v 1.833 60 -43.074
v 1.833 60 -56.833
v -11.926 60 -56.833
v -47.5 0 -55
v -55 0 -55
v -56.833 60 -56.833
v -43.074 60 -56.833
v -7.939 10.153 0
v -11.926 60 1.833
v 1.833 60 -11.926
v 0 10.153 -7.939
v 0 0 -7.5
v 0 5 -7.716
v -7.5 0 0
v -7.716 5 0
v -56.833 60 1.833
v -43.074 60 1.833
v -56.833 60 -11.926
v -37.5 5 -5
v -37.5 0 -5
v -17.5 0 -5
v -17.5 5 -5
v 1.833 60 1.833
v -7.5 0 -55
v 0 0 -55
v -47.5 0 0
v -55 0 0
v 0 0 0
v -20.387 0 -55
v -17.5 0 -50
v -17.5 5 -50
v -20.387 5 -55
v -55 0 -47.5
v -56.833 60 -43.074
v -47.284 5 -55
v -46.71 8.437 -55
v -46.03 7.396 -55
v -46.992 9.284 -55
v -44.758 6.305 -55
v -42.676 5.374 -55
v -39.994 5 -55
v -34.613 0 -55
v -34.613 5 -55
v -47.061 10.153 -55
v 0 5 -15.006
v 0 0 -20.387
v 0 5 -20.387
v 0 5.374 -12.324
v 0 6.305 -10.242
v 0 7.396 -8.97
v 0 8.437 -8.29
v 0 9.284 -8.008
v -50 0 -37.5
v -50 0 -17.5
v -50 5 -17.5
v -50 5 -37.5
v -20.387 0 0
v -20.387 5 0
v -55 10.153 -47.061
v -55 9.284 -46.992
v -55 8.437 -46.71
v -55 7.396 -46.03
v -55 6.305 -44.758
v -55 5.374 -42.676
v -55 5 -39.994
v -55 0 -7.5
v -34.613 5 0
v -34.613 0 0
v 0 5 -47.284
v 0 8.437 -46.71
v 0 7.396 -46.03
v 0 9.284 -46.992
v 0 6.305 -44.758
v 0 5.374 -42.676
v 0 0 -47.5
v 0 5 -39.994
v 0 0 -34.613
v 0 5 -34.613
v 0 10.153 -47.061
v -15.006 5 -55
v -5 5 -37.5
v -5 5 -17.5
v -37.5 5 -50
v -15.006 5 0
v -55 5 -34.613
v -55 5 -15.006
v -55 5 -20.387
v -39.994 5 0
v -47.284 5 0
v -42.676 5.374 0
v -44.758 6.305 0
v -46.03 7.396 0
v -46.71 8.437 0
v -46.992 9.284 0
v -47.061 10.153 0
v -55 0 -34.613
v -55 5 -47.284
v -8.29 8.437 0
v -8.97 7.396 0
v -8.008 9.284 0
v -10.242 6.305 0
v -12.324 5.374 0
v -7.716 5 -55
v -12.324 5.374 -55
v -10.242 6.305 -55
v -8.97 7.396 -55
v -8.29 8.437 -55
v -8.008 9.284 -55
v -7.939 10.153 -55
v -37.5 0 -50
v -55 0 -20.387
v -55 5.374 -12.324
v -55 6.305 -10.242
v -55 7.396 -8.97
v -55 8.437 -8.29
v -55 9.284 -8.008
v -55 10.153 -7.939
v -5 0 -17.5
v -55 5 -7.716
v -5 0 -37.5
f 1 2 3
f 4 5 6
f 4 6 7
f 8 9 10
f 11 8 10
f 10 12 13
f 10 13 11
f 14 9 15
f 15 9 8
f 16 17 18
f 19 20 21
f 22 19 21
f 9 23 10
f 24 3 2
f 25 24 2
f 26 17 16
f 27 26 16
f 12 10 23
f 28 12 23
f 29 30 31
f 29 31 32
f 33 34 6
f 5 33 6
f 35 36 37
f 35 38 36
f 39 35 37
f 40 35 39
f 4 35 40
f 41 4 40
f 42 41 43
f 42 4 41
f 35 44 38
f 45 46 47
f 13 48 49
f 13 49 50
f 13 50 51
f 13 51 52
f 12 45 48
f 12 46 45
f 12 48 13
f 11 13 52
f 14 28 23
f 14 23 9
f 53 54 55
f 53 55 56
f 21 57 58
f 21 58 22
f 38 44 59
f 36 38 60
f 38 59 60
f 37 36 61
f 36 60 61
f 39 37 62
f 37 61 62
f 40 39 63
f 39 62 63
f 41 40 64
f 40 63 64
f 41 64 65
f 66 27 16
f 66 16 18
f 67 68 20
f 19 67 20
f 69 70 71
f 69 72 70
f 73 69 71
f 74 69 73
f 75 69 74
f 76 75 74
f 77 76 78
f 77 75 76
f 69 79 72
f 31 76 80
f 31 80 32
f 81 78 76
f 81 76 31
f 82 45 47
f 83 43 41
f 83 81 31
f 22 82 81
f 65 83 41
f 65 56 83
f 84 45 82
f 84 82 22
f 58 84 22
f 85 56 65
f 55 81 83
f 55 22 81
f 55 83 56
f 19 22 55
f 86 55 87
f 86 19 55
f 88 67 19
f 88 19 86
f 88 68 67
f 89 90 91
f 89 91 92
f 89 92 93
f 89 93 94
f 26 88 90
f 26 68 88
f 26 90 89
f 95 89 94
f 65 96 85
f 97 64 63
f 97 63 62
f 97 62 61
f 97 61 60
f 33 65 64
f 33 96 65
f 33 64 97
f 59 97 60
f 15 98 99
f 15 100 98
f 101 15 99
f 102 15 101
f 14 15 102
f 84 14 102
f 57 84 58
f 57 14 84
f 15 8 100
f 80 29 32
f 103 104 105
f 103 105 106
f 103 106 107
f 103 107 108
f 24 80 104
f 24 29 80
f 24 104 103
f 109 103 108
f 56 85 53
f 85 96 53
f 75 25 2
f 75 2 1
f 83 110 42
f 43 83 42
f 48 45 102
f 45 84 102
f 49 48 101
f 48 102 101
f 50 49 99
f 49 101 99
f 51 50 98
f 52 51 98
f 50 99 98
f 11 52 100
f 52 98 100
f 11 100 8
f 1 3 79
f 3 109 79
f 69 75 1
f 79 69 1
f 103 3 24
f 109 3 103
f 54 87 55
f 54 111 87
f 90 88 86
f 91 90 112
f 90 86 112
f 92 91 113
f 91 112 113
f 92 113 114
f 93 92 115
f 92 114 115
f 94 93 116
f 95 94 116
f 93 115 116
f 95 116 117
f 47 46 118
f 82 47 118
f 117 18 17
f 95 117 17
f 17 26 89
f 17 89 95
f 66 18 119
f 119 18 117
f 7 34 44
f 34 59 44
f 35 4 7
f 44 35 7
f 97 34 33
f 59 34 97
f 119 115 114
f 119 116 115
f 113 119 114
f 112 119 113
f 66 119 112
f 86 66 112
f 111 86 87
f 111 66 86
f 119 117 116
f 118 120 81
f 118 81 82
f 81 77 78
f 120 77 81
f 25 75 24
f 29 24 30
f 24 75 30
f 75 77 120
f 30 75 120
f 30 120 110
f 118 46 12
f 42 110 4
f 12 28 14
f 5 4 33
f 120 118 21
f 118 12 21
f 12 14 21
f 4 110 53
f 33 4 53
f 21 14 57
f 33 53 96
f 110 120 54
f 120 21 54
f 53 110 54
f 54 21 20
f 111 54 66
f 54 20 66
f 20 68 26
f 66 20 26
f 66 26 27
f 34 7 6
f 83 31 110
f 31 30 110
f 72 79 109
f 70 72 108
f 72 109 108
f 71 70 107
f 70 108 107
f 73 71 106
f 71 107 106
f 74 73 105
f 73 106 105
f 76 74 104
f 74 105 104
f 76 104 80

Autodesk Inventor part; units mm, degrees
ref_plane "YZ Plane" through (0, 0, 0) normal (1, 0, 0) x (0, 1, 0)
ref_plane "XZ Plane" through (0, 0, 0) normal (0, 1, 0) x (-1, 0, 0)
ref_plane "XY Plane" through (0, 0, 0) normal (0, 0, 1) x (1, 0, 0)
sketch "Sketch1" plane through (0, 0, 0) normal (0, 1, 0) x (-1, 0, 0)
  line L0 (0, 0) -> (55, 0)
  line L1 (55, 0) -> (55, -55)
  line L2 (55, -55) -> (0, -55)
  line L3 (0, -55) -> (0, 0)
  line L4 (55, -27.5) -> (0, -27.5) construction
  line L5 (27.5, -55) -> (27.5, 0) construction
  line L6 (20.3868, -55) -> (34.6132, -55)
  line L7 (34.6842, -50) -> (21.2609, -50)
  line L8 (50, -17.5) -> (50, -33.6438)
  line L9 (55, -34.6132) -> (55, -20.3868)
  line L10 (5, -18.3051) -> (5, -36.8563)
  line L11 (0, -34.6132) -> (0, -20.3868)
  line L12 (20.3868, 0) -> (34.6132, 0)
  line L13 (37.7365, -5) -> (17.5, -5)
  line L14 (55, -34.6132) -> (50, -37.5)
  line L15 (50, -37.5) -> (50, -33.6438)
  line L16 (55, -20.3868) -> (50, -17.5)
  line L17 (34.6842, -50) -> (37.5, -50)
  line L18 (37.5, -50) -> (34.6132, -55)
  line L19 (21.2609, -50) -> (17.5, -50)
  line L20 (17.5, -50) -> (20.3868, -55)
  line L21 (0, -34.6132) -> (5, -37.5)
  line L22 (5, -37.5) -> (5, -36.8563)
  line L23 (0, -20.3868) -> (5, -17.5)
  line L24 (5, -17.5) -> (5, -18.3051)
  line L25 (20.3868, 0) -> (17.5, -5)
  line L26 (34.6132, 0) -> (37.5, -5)
  line L27 (37.5, -5) -> (37.7365, -5)
  line L28 (55, -47.5) -> (47.5, -55)
  line L29 (55, -7.5) -> (47.5, 0)
  line L30 (7.5, -55) -> (0, -47.5)
  line L31 (7.5, 0) -> (0, -7.5)
  line L32 (55, 0) -> (0, 0)
  line L33 (0, 0) -> (0, -55)
  line L34 (0, -55) -> (55, -55)
  line L35 (55, -55) -> (55, 0)
  dimension "d0" = 55
  dimension "d1" = 55
  dimension "d4" = 5
  dimension "d5" = 5
  dimension "d6" = 60
  dimension "d9" = 60
  dimension "d10" = 60
  dimension "d13" = 20
  dimension "d14" = 10
  dimension "d15" = 60
  dimension "d16" = 5
  dimension "d18" = 60
  dimension "d19" = 5
  dimension "d20" = 20
  dimension "d21" = 10
  dimension "d22" = 10
  dimension "d23" = 20
  dimension "d24" = 20
  dimension "d25" = 10
  dimension "d26" = 7.5
  dimension "d27" = 7.5
  dimension "d28" = 7.5
  dimension "d29" = 7.5
  dimension "d30" = 7.5
  dimension "d31" = 7.5
extrude "Extrusion1" add sketch "Sketch1" along normal blind 5 contours L0 L25 L13 L26 L29 L1 L16 L8 L15 L14 L28 L2 L18 L17 L7 L19 L20 L30 L3 L21 L22 L10 L24 L23 L31
extrude "Extrusion2" add sketch "Sketch1" along normal blind 60 draft 1.75 contours L0 L31 L3 | L0 L1 L29 | L30 L2 L3 | L1 L2 L28
fillet "Fillet1" radius 5 4 edges at (-3.858, 5, -51.142) (-3.858, 5, -3.858) (-51.142, 5, -51.142) (-51.142, 5, -3.858)
equation "\"d0\" = side_length"
equation "\"d1\" = side_length"
equation "\"d4\" = dovetail_depth"
equation "\"d5\" = dovetail_depth"
equation "\"d13\" = dovetail_max_length"
equation "\"d14\" = 0.5 * dovetail_max_length"
equation "\"d16\" = dovetail_depth"
equation "\"d19\" = dovetail_depth"
equation "\"d20\" = dovetail_max_length"
equation "\"d21\" = 0.5 * dovetail_max_length"
equation "\"d22\" = 0.5 * dovetail_max_length"
equation "\"d23\" = dovetail_max_length"
equation "\"d24\" = dovetail_max_length"
equation "\"d25\" = 0.5 * dovetail_max_length"
equation "\"d26\" = claw_wall_side_length"
equation "\"d27\" = claw_wall_side_length"
equation "\"d28\" = claw_wall_side_length"
equation "\"d29\" = claw_wall_side_length"
equation "\"d30\" = claw_wall_side_length"
equation "\"d31\" = claw_wall_side_length"
equation "\"side_length\" = 55"
equation "\"dovetail_depth\" = 5"
equation "\"dovetail_max_length\" = 20"
equation "\"claw_wall_side_length\" = 7.5"
equation "\"band_notch_height\" = 45"
properties part number "Duck_Holder"
